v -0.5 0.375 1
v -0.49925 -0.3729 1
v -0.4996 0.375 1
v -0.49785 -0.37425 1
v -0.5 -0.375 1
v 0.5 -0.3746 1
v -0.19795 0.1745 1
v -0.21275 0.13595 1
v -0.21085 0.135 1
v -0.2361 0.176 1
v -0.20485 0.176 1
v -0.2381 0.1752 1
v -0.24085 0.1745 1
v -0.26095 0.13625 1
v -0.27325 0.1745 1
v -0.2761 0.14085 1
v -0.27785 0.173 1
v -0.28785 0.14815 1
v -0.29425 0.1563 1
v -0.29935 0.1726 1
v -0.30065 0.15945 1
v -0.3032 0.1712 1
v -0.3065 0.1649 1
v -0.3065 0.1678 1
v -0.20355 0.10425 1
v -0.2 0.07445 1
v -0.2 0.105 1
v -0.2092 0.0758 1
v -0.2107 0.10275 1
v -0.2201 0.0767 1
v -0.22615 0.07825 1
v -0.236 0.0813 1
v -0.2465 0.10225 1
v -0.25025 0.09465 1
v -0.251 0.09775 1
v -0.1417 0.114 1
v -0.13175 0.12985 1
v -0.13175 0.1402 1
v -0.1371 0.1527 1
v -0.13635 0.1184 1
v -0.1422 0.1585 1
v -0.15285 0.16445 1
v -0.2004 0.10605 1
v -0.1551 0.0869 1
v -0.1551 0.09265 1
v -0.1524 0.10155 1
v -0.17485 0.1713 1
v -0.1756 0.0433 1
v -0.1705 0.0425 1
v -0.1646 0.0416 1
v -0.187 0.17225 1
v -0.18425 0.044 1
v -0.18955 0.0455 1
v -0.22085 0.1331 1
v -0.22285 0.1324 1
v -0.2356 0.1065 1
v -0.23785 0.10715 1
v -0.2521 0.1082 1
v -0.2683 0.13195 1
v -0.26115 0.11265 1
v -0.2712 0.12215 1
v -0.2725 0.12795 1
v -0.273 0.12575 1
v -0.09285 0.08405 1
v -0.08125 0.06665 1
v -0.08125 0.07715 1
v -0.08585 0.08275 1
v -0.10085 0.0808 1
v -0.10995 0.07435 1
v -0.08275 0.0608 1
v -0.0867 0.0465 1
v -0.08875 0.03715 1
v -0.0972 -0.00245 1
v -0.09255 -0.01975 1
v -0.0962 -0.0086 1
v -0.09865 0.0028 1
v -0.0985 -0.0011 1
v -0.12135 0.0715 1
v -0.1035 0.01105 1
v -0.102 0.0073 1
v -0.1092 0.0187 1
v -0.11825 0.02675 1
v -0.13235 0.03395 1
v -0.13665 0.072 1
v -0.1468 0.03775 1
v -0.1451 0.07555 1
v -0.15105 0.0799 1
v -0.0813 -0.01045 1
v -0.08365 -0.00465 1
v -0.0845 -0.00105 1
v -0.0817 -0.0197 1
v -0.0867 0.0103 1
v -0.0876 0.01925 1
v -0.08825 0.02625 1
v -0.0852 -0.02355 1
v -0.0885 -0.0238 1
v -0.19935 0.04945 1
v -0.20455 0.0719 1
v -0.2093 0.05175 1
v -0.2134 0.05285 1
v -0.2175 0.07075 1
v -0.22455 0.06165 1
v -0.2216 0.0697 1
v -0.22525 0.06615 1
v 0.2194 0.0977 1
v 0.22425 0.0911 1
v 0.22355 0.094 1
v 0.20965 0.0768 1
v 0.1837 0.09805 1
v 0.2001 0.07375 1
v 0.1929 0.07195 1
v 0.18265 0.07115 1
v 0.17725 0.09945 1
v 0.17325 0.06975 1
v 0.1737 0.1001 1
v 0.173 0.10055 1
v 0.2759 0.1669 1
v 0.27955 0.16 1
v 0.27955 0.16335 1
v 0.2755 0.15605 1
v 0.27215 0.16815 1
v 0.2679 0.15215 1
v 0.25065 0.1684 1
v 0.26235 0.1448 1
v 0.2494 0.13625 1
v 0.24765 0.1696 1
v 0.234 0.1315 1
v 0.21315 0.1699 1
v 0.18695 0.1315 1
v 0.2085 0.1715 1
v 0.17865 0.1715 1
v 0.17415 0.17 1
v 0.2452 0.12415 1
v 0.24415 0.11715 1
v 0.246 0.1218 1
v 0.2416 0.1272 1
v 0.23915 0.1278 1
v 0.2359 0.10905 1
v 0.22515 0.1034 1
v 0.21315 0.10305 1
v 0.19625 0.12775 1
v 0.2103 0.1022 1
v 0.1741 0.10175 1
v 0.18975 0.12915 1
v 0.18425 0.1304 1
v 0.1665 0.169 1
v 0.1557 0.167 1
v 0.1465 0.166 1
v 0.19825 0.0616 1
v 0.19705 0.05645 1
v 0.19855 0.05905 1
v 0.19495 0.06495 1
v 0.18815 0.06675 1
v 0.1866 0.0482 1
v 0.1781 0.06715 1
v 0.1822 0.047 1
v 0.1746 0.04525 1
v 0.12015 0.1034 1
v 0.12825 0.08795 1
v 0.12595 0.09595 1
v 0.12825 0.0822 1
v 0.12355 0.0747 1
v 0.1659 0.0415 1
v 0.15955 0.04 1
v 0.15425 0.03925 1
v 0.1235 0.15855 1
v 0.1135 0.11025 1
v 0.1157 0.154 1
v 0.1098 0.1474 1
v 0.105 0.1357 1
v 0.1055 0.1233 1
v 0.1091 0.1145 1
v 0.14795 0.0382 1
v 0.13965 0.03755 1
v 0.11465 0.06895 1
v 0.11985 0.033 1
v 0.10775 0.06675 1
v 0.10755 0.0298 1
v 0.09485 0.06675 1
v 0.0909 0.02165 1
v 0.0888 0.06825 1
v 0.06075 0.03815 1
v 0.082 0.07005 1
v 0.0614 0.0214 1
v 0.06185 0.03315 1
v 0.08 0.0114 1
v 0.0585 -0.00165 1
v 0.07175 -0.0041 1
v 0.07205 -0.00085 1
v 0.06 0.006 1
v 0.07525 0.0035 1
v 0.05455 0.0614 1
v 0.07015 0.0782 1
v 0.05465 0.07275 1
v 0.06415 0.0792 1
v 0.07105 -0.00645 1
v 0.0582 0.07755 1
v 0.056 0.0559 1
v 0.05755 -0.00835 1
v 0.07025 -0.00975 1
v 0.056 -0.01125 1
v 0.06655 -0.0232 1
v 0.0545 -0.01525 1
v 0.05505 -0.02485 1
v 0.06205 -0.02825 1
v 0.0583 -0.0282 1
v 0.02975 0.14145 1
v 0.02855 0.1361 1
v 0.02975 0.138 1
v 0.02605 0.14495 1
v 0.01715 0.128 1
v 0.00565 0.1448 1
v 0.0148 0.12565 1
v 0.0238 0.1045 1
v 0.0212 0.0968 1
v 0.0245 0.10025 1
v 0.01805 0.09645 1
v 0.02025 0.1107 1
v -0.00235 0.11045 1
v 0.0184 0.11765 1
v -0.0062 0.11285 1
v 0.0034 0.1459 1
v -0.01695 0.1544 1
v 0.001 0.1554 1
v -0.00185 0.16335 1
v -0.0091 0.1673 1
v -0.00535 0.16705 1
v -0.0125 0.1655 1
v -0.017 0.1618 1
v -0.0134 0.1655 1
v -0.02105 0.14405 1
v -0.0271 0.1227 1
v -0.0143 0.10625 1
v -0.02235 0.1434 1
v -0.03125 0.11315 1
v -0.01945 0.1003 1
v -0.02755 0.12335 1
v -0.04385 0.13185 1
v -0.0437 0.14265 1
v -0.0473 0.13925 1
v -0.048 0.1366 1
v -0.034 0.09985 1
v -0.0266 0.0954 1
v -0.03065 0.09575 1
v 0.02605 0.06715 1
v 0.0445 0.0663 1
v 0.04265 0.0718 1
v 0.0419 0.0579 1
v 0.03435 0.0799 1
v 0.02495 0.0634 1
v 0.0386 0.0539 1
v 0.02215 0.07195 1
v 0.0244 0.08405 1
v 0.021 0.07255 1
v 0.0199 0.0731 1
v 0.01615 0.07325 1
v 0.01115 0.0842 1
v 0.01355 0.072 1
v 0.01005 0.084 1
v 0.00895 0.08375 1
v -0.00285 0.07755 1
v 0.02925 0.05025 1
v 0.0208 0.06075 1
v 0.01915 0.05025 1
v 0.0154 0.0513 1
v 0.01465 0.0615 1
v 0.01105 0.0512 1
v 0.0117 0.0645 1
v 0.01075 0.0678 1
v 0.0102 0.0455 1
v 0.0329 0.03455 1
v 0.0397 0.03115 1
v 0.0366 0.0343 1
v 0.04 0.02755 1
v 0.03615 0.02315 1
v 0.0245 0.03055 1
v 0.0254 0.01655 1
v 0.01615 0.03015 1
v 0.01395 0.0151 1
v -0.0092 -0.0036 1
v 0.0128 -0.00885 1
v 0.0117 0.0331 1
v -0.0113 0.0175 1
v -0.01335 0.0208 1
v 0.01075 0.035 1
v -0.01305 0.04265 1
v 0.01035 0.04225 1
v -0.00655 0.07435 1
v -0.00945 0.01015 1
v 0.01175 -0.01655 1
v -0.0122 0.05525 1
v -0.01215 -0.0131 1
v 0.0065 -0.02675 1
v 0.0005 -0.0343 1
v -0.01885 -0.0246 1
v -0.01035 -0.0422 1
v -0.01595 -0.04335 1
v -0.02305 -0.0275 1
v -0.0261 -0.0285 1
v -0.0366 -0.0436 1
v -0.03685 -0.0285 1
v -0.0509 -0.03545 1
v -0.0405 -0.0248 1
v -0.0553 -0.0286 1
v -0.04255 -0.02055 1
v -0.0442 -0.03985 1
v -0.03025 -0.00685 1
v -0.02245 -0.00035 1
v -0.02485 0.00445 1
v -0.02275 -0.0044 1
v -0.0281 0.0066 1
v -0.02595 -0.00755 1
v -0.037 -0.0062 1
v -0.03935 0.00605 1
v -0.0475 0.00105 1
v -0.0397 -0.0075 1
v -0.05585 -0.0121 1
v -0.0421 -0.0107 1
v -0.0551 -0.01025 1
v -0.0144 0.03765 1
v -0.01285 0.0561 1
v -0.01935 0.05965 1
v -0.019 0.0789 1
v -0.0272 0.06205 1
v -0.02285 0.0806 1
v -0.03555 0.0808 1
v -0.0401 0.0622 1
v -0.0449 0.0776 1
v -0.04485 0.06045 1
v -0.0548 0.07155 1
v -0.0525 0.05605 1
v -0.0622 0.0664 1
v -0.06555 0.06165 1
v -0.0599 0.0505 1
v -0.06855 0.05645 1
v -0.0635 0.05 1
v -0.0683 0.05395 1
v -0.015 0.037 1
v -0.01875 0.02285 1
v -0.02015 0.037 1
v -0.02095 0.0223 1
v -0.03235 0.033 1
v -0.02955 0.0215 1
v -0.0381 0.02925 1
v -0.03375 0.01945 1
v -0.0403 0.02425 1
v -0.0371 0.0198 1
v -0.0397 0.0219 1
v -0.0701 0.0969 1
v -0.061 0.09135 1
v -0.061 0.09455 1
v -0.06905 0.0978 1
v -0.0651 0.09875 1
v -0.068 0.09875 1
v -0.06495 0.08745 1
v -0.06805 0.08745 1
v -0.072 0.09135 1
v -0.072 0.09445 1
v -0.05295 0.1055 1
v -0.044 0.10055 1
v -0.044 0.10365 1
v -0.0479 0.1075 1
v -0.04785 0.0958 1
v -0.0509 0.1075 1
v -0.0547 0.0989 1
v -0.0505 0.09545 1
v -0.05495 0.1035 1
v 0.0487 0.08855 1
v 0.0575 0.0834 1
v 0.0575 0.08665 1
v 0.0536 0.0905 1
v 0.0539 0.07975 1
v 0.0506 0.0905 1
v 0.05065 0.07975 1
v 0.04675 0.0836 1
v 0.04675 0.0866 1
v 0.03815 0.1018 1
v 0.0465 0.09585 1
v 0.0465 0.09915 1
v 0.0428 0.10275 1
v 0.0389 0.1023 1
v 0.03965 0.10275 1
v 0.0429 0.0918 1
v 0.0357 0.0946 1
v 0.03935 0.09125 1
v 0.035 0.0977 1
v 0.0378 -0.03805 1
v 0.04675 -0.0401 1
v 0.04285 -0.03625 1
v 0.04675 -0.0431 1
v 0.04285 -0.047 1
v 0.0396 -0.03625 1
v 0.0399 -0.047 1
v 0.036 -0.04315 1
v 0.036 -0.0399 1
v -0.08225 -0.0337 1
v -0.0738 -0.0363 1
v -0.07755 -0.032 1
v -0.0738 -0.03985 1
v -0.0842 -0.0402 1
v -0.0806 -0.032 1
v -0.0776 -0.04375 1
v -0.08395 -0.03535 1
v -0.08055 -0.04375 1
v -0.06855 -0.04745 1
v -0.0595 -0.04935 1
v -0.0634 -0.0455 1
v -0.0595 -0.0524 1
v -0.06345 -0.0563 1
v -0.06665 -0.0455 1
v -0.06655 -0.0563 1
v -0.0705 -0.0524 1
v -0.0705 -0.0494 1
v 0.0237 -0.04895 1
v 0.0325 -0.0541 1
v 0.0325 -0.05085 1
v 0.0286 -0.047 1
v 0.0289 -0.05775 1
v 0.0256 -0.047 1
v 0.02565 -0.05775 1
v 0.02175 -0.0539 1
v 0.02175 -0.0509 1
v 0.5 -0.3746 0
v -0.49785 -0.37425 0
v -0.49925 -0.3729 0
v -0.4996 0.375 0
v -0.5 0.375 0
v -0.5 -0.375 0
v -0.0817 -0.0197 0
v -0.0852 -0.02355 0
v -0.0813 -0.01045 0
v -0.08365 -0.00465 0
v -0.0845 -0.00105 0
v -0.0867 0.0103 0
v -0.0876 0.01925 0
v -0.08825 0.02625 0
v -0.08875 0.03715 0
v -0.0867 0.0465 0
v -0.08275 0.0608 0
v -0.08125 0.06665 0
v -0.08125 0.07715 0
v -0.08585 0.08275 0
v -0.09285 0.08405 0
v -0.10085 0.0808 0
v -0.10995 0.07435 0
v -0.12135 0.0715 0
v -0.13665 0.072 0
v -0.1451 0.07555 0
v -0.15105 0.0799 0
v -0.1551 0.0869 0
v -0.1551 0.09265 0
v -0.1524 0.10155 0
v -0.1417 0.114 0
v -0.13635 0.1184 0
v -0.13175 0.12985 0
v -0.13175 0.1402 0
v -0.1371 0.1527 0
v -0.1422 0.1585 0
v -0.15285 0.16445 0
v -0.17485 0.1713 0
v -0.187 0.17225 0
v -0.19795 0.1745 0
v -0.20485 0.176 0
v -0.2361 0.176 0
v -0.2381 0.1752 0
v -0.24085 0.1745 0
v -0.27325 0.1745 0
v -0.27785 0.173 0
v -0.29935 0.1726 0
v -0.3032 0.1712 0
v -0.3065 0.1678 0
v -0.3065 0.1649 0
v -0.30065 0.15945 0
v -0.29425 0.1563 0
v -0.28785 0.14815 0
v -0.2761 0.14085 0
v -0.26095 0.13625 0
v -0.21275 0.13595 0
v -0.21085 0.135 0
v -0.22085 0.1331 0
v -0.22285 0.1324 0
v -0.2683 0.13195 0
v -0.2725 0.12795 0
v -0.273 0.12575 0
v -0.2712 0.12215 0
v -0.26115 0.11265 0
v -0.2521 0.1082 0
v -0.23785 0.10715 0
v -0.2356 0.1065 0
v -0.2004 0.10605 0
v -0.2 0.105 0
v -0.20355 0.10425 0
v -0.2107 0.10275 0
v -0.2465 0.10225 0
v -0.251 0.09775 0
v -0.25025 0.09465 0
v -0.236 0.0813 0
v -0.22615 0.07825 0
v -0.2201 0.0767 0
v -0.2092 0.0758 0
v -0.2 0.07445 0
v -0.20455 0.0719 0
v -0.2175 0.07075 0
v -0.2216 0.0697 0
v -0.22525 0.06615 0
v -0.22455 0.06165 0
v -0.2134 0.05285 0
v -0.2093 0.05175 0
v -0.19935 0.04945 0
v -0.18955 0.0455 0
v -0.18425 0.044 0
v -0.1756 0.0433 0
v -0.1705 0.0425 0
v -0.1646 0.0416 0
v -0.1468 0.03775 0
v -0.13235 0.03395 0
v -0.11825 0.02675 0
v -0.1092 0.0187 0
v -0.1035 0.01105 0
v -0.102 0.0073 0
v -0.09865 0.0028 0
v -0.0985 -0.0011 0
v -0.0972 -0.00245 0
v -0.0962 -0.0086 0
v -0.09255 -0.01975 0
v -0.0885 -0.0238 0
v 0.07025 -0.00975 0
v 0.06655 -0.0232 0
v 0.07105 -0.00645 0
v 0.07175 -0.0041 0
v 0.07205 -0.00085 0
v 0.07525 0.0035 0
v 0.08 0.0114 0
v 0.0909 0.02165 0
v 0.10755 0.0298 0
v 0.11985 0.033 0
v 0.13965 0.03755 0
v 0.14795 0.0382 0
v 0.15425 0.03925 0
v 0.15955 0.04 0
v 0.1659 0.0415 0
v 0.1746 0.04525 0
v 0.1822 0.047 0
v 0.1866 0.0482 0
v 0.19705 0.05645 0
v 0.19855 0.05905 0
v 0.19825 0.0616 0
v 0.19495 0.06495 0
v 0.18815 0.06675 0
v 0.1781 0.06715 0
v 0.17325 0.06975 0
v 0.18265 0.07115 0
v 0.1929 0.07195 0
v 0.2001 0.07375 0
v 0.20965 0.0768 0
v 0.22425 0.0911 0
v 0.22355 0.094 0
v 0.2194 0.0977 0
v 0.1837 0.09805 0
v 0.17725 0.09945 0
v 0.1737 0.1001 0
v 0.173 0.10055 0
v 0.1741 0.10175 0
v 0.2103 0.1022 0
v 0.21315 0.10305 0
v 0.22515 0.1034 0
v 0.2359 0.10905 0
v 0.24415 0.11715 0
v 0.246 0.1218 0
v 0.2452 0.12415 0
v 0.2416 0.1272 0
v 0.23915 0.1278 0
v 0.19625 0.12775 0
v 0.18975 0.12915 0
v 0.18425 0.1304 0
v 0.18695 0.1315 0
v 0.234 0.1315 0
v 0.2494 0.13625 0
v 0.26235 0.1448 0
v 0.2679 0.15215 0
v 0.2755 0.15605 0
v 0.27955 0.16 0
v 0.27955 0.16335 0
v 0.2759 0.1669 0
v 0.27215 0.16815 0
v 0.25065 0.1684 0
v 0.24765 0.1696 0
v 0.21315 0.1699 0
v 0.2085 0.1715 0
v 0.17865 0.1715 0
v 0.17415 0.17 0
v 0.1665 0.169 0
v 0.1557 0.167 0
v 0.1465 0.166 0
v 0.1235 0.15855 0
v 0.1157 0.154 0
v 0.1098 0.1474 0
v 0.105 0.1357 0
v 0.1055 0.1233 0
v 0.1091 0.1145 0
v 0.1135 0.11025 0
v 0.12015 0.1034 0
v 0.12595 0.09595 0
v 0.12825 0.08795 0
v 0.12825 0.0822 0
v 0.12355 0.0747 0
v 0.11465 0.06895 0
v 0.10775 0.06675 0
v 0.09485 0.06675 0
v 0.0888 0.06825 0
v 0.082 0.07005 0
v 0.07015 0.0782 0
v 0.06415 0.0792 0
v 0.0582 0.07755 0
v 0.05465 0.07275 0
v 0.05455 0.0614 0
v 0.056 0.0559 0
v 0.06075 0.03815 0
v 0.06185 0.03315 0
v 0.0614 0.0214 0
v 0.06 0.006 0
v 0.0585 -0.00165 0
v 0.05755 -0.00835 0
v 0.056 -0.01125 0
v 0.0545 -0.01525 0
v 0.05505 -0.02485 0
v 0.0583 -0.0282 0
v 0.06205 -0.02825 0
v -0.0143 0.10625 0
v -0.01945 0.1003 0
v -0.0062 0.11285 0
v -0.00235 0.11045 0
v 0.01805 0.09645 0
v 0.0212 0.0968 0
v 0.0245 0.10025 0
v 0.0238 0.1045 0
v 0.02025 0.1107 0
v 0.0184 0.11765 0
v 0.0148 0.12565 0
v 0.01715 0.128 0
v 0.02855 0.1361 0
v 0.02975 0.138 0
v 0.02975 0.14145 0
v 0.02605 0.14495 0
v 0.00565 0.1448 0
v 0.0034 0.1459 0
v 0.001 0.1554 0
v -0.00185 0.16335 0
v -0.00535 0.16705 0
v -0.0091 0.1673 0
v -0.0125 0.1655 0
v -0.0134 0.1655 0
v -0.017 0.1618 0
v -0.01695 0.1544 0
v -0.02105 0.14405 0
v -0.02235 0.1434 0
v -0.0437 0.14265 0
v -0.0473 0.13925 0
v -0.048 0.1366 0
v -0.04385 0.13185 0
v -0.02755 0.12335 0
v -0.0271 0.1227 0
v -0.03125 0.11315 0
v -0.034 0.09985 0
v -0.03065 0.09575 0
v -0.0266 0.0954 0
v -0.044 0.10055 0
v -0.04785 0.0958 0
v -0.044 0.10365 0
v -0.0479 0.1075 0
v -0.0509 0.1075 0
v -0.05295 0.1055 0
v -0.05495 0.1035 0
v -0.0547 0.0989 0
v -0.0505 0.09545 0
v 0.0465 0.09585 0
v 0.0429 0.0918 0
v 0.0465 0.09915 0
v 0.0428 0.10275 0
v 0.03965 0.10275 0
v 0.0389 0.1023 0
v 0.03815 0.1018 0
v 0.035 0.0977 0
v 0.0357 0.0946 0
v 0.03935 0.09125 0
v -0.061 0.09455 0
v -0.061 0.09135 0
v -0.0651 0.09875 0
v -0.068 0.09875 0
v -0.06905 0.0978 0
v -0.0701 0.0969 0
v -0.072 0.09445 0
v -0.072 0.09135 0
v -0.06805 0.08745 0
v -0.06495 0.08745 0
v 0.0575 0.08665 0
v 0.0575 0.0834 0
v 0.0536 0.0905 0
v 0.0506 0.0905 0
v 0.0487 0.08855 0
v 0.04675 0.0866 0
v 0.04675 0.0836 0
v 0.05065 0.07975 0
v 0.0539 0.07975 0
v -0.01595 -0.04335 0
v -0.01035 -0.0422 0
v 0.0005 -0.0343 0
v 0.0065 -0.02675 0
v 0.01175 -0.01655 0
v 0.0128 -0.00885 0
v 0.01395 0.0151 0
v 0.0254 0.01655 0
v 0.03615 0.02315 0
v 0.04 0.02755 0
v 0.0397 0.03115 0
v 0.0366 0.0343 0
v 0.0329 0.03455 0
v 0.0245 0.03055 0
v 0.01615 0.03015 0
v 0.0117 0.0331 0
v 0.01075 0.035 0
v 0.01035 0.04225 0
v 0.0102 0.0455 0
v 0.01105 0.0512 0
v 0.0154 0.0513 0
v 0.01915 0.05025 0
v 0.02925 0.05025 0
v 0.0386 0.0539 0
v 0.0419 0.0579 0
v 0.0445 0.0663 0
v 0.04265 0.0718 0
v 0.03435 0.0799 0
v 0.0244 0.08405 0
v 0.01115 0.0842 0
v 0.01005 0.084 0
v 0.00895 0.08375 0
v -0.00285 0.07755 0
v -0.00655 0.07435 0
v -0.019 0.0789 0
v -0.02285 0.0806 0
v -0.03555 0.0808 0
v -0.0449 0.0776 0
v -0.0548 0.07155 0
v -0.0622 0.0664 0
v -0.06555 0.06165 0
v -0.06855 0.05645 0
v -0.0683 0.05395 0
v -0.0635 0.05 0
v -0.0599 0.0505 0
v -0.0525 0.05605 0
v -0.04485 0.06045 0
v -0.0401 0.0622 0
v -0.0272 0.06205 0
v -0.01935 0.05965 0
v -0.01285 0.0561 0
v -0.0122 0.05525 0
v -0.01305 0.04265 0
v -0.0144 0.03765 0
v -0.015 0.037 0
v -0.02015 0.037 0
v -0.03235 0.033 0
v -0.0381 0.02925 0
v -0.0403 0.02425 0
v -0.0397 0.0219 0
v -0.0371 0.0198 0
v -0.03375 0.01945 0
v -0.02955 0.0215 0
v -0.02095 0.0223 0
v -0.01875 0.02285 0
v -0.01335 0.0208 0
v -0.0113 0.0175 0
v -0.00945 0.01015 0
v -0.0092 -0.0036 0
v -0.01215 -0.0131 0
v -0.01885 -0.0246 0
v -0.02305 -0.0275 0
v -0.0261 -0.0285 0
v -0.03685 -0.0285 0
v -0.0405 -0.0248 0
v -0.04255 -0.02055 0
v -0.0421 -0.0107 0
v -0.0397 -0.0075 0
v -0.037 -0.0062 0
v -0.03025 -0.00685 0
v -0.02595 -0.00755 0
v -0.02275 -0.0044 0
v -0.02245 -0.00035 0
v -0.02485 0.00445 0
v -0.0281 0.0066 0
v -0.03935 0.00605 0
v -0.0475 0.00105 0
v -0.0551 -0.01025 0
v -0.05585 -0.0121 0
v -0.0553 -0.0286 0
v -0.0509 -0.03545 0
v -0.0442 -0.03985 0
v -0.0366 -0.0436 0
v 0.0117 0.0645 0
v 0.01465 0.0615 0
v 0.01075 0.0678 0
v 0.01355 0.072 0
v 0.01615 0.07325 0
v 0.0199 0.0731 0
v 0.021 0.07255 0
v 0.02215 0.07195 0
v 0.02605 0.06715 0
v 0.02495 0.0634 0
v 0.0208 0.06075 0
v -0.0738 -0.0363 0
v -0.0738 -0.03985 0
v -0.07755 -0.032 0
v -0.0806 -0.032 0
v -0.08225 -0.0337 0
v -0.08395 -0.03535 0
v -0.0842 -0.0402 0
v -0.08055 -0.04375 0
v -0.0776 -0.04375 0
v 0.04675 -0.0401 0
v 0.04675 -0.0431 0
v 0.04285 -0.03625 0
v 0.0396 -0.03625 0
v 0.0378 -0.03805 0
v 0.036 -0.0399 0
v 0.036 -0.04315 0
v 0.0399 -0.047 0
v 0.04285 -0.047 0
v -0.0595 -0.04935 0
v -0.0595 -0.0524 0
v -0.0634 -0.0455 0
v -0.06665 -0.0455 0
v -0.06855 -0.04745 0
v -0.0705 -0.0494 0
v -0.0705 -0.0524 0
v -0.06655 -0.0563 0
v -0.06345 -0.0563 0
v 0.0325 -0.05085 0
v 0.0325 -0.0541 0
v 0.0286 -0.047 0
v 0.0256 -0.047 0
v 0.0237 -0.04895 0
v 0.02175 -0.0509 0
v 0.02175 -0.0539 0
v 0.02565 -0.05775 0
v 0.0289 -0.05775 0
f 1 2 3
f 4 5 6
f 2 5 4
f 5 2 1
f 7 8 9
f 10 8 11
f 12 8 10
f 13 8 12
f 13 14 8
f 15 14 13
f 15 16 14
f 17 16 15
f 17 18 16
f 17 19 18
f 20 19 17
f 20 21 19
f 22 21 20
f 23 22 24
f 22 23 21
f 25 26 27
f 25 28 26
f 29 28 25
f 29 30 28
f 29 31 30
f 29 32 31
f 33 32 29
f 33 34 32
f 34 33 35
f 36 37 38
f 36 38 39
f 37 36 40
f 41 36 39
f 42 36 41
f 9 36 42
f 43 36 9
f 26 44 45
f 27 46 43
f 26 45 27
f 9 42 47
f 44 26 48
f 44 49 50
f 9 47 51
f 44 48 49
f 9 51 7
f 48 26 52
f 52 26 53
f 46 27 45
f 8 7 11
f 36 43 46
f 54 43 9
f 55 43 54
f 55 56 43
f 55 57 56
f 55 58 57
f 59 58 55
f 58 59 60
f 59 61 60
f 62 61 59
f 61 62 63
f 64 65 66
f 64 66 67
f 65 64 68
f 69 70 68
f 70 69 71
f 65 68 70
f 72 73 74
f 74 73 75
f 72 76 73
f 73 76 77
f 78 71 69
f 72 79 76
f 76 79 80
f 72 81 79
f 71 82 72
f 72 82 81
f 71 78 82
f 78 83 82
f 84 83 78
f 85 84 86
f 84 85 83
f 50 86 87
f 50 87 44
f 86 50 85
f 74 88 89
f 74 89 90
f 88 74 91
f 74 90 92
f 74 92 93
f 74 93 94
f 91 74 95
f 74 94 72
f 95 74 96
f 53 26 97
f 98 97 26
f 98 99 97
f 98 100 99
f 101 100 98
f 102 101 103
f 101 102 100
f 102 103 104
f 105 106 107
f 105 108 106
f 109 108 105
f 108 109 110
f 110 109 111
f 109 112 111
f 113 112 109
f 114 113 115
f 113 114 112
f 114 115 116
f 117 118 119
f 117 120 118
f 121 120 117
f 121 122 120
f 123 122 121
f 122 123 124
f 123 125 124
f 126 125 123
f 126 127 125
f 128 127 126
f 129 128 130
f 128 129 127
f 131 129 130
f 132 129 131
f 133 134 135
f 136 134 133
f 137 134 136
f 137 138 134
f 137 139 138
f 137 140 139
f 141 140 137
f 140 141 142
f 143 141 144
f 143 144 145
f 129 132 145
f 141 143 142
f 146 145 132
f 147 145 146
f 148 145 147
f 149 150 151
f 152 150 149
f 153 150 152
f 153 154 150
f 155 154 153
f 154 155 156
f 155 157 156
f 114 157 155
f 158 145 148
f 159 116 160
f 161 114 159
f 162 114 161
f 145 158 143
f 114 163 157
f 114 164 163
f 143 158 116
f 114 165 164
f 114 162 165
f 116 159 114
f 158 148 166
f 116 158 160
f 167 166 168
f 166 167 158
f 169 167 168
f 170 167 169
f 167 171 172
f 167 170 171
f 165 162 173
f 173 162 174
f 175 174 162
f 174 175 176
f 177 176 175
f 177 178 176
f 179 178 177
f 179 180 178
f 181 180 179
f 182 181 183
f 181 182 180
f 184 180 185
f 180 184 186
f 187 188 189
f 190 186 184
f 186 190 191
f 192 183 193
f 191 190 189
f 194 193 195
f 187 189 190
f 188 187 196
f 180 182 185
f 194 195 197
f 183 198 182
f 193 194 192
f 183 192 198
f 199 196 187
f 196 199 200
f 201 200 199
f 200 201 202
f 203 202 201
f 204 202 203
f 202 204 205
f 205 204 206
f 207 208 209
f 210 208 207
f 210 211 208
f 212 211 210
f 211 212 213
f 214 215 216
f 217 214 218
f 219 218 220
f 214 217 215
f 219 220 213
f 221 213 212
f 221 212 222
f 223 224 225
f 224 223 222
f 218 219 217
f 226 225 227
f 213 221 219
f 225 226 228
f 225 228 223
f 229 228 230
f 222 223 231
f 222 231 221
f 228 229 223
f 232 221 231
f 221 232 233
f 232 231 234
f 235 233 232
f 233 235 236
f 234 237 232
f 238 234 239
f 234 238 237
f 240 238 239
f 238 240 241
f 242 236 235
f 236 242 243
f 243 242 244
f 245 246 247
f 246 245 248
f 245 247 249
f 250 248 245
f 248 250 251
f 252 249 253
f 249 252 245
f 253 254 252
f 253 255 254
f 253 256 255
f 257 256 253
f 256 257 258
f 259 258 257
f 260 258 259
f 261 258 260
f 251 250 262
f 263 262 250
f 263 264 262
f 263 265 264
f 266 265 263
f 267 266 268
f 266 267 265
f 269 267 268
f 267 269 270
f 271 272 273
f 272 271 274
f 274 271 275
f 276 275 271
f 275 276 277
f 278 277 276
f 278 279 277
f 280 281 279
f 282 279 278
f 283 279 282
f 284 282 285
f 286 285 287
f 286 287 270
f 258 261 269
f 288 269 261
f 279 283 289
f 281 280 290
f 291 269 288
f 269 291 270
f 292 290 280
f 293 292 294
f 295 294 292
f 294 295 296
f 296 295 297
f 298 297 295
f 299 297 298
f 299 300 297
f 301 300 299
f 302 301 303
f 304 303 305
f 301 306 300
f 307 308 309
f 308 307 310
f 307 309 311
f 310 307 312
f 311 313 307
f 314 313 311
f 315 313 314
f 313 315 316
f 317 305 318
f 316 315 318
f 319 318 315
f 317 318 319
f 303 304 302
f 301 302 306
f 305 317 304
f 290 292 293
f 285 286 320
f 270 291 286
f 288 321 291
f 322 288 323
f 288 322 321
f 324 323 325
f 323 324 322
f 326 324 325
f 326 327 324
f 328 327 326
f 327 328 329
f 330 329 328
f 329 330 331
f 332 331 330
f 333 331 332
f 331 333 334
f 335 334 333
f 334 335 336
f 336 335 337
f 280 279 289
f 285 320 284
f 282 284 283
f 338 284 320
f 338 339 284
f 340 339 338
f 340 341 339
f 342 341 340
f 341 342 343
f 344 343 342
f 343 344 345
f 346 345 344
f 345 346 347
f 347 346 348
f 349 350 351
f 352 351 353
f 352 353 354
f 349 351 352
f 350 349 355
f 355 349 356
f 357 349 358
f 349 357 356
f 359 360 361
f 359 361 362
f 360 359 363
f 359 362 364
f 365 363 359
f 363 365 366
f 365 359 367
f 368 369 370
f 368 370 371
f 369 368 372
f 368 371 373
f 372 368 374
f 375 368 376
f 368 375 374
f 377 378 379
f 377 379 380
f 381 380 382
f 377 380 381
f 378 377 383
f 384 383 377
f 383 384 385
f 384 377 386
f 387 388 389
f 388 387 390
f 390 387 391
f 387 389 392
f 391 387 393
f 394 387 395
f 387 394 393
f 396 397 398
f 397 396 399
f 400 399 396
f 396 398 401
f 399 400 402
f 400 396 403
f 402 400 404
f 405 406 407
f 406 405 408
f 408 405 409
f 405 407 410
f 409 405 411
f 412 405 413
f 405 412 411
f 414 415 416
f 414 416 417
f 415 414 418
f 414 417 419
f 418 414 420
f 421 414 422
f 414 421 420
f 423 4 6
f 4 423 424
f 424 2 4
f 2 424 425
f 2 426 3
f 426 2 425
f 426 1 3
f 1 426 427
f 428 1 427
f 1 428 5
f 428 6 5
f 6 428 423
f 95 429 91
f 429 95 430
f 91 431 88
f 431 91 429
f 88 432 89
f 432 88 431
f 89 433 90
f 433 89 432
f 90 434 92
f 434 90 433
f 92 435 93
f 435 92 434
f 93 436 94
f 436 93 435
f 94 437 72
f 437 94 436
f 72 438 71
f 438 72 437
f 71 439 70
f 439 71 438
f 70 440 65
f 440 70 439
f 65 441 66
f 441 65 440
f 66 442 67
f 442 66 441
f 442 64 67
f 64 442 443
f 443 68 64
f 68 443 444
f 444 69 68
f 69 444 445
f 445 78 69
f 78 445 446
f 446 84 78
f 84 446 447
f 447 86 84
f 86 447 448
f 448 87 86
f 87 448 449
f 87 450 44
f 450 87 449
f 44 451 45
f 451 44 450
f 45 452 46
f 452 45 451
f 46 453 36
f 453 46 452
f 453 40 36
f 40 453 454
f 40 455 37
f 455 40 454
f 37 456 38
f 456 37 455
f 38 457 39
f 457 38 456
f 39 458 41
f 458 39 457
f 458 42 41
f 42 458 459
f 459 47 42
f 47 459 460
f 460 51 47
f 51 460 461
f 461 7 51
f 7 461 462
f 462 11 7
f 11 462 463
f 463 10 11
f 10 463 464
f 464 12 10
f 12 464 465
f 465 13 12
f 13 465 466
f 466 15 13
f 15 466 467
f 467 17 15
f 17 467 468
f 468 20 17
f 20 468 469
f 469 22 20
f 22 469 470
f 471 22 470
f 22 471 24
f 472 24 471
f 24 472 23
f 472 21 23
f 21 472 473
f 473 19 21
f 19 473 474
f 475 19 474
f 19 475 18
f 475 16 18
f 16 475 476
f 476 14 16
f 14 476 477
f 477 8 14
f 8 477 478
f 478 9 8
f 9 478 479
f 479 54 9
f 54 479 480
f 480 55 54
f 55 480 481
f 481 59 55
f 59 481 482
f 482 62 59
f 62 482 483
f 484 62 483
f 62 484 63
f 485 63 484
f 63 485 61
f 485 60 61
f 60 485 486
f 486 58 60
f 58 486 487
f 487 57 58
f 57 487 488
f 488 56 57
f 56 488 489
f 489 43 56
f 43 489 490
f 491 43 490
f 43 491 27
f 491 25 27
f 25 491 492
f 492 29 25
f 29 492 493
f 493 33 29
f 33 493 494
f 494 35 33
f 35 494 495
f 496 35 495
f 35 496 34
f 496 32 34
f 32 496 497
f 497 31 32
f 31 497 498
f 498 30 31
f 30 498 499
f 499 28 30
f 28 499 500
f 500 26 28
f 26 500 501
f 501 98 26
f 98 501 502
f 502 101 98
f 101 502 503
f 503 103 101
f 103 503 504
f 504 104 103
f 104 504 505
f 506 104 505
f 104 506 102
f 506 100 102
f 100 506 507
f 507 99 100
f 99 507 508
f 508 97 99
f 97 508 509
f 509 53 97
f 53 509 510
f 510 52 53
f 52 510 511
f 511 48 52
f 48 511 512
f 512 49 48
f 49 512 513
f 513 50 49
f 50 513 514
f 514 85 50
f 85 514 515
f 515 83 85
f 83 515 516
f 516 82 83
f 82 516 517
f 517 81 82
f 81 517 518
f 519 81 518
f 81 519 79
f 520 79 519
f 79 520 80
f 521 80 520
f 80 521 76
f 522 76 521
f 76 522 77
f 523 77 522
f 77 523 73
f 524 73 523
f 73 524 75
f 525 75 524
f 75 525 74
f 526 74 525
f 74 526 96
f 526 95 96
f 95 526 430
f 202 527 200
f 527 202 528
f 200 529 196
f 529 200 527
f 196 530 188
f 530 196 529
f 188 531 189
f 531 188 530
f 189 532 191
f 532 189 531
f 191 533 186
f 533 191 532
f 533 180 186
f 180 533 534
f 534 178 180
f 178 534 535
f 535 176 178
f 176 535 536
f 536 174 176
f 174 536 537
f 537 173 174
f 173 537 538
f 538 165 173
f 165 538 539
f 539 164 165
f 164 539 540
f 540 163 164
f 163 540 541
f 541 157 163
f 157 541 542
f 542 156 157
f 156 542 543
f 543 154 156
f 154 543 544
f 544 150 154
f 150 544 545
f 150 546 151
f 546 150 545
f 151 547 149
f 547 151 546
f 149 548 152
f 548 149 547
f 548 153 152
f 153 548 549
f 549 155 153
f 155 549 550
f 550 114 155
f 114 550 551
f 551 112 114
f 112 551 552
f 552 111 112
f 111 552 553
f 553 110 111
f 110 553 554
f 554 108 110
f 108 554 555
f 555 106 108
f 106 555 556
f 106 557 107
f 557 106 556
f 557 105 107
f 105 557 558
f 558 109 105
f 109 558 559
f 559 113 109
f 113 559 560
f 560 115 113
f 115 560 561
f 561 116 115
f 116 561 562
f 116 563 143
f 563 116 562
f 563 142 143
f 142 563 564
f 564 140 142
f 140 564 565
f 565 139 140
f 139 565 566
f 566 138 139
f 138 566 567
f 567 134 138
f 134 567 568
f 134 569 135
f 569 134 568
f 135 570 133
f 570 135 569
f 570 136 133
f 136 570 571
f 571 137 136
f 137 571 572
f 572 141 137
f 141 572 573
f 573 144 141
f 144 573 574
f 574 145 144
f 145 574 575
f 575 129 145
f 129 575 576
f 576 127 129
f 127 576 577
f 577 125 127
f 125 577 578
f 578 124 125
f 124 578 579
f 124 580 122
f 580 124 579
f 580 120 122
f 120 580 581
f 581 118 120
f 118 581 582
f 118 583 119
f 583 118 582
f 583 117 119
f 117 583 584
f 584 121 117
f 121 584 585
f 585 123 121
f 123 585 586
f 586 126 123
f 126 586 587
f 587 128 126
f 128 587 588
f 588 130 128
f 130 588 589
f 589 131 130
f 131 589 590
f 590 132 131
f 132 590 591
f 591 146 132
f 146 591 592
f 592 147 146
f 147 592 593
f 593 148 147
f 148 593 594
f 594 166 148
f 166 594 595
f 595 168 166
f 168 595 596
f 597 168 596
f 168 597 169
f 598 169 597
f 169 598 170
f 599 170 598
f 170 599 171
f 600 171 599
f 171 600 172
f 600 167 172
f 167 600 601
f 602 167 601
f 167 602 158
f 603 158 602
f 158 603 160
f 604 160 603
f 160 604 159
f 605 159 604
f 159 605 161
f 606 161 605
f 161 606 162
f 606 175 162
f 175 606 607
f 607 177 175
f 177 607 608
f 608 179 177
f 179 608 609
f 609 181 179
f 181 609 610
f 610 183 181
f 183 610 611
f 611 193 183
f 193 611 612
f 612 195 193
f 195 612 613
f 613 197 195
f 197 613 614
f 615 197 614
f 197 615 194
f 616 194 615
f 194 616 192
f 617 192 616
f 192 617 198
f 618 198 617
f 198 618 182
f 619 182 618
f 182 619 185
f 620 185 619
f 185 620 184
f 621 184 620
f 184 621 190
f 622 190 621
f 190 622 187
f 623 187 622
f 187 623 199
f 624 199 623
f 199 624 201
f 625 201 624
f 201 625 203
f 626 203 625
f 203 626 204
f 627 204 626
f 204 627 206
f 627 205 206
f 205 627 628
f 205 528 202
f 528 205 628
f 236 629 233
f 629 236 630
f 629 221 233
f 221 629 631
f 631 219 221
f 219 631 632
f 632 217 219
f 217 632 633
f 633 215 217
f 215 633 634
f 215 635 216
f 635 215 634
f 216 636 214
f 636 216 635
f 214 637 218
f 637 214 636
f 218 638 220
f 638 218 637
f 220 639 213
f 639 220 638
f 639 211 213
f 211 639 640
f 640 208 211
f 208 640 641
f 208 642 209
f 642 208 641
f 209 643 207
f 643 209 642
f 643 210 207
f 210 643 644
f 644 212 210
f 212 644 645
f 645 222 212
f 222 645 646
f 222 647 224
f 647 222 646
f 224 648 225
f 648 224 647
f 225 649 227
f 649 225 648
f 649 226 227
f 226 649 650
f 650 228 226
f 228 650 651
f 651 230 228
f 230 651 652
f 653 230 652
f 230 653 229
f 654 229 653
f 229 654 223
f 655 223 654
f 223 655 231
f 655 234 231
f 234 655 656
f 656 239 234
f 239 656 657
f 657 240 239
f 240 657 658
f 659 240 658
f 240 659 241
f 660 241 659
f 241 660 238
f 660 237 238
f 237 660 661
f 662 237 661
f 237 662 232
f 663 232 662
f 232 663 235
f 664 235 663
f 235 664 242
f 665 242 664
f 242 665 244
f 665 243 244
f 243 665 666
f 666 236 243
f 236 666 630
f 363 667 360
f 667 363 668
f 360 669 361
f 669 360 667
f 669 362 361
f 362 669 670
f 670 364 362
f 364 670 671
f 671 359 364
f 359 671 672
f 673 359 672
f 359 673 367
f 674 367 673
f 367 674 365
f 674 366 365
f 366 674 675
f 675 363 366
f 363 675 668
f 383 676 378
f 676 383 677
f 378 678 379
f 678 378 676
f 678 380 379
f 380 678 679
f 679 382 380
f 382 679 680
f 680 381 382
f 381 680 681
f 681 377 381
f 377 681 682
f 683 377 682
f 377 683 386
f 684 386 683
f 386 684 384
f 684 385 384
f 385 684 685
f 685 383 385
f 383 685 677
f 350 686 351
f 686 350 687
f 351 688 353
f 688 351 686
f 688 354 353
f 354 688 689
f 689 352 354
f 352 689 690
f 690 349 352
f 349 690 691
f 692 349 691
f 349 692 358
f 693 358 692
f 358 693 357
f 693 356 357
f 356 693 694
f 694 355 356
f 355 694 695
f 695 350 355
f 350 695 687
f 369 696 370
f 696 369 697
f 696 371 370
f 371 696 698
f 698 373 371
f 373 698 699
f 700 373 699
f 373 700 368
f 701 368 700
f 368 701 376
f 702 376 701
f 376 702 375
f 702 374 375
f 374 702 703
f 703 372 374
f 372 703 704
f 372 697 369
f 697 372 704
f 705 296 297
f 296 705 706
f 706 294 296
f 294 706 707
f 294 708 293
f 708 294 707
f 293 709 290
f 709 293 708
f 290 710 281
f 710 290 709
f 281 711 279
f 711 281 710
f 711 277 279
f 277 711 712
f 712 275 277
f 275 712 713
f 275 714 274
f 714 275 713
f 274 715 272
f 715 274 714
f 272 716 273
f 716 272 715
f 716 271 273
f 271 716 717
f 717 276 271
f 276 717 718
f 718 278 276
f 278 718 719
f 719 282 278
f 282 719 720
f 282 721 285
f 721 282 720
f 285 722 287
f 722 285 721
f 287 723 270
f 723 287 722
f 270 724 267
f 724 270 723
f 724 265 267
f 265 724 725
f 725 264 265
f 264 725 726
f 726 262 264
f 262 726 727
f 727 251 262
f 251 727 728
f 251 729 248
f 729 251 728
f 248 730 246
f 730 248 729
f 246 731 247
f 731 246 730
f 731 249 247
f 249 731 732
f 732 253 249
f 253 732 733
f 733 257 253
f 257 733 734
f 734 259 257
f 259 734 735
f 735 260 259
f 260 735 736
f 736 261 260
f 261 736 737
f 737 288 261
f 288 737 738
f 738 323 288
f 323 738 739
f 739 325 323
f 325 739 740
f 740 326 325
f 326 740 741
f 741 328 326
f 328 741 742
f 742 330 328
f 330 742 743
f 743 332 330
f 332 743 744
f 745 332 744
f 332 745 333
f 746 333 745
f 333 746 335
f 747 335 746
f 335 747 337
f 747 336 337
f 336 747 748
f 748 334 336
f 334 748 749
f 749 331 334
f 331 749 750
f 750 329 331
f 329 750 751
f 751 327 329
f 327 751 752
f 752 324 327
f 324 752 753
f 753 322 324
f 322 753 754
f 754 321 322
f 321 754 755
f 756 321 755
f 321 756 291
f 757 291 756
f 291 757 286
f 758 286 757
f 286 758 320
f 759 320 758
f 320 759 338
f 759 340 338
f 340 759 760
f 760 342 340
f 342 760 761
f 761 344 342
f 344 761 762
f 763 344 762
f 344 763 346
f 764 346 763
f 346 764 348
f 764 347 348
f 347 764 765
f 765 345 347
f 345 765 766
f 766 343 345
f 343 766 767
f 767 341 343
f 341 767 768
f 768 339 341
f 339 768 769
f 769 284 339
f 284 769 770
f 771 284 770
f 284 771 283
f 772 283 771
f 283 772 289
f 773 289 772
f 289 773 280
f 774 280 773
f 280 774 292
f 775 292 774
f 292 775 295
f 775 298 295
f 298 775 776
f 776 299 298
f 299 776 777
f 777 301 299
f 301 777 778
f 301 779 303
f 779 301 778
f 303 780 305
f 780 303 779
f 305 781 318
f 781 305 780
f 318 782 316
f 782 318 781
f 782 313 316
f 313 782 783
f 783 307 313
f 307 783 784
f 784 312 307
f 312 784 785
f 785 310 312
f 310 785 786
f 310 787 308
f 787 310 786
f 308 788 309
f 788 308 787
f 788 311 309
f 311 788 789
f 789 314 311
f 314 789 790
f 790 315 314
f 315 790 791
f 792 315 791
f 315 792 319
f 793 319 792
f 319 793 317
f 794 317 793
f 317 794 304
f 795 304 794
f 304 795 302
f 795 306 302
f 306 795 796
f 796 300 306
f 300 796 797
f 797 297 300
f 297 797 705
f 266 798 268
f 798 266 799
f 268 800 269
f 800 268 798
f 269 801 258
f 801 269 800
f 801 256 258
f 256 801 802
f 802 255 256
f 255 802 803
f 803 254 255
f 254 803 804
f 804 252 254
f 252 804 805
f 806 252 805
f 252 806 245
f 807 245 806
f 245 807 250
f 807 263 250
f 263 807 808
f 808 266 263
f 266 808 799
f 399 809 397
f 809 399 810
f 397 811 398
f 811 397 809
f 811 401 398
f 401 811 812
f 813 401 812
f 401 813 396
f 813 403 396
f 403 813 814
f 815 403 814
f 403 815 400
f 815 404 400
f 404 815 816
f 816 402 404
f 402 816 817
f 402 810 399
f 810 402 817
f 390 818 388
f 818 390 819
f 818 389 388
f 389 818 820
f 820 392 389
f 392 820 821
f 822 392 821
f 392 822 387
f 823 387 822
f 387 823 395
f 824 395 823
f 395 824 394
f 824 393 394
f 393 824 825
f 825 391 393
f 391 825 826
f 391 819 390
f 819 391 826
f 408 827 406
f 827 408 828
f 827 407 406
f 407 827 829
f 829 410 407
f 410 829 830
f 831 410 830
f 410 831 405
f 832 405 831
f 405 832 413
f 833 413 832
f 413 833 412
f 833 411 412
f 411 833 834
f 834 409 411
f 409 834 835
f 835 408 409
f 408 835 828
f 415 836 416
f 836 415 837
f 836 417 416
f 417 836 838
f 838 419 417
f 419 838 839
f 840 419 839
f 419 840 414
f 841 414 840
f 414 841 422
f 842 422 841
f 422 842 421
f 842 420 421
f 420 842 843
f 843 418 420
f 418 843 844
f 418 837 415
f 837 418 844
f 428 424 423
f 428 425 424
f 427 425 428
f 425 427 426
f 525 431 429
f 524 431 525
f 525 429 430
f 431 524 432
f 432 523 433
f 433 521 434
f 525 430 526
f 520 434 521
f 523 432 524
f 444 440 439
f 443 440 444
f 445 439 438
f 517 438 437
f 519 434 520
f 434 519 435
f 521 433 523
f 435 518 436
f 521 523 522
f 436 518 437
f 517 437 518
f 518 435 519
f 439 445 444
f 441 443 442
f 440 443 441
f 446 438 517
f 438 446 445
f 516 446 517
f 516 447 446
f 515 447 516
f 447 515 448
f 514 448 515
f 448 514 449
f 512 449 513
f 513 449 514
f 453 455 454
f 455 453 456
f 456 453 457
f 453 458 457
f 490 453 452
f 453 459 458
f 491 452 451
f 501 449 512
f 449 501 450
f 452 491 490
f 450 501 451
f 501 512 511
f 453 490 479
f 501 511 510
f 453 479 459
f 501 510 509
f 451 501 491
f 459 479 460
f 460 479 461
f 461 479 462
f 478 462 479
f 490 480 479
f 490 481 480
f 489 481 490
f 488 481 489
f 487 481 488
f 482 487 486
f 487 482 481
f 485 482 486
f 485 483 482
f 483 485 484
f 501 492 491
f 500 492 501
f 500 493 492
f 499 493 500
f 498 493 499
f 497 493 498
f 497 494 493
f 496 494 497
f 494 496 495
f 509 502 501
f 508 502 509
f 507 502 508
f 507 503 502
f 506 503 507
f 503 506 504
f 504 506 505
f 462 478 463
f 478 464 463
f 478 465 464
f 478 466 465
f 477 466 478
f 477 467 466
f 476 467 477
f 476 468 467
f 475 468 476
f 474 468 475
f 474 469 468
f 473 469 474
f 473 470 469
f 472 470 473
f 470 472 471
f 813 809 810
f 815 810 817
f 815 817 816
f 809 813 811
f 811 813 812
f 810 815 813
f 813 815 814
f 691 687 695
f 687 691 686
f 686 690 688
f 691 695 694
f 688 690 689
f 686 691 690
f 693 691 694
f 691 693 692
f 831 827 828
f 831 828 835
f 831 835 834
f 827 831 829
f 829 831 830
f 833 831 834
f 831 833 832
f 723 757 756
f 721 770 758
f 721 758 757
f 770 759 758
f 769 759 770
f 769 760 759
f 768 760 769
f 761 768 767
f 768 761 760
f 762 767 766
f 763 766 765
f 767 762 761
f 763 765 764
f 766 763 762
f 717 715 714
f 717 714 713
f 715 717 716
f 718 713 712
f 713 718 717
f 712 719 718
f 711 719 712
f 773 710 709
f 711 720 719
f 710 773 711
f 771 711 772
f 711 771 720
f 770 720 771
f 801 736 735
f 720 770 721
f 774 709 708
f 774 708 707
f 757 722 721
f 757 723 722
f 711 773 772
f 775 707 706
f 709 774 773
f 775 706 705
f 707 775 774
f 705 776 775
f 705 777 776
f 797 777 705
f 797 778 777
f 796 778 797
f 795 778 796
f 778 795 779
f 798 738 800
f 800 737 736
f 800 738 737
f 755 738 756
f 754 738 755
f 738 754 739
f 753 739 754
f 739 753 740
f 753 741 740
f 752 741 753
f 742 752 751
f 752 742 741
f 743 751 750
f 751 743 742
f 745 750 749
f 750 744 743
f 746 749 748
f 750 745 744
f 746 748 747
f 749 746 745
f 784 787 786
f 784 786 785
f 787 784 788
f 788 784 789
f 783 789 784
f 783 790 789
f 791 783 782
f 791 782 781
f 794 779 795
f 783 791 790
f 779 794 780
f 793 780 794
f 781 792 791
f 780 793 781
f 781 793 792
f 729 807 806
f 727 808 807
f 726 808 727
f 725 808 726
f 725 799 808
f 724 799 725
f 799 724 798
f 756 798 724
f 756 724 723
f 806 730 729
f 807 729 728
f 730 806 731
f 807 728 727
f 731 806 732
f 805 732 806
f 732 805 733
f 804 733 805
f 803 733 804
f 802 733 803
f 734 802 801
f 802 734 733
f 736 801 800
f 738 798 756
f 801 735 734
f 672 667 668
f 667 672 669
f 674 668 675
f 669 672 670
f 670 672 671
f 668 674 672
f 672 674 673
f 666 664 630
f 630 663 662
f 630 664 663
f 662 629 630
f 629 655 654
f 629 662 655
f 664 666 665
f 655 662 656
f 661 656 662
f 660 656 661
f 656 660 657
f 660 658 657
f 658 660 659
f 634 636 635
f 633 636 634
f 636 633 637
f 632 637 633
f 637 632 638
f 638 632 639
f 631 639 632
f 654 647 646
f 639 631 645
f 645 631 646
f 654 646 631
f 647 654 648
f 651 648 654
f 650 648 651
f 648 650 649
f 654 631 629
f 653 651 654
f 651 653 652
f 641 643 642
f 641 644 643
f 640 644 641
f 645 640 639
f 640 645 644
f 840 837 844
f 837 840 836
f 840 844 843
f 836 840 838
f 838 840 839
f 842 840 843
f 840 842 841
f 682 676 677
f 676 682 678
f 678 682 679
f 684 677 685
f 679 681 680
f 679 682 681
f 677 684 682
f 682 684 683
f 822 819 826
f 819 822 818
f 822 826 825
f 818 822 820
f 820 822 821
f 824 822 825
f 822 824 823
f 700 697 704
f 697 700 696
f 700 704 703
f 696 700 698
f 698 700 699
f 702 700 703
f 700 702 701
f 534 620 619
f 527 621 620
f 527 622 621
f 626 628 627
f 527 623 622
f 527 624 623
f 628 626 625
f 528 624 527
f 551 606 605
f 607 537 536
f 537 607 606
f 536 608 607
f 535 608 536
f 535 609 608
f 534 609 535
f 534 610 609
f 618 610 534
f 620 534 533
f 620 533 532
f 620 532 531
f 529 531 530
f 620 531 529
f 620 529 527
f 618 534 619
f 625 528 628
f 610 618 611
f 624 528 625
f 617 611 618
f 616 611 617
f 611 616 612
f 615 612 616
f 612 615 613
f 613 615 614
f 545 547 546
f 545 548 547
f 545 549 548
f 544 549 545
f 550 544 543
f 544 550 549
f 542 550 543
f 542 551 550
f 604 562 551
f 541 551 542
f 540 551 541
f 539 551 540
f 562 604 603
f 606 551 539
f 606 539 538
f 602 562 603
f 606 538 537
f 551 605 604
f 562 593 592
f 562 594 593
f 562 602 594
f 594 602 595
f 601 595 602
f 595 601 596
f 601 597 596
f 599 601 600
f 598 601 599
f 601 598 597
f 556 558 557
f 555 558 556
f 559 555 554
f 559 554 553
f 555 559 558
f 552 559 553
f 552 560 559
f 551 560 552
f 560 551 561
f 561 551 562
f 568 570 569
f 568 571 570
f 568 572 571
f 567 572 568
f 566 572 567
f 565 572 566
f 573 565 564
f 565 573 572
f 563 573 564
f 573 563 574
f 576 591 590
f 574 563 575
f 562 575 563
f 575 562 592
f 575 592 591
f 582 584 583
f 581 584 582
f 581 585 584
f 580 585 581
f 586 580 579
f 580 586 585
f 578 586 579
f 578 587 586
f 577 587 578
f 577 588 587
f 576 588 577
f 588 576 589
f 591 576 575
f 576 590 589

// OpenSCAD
module FlyingF_1()
{
 /* Generated by trace2scad version 20150415
    http://aggregate.org/MAKE/TRACE2SCAD/
    Optimized model has 427/1534 original points
 */
 color([0.5, 0.5, 0.5])
 assign(minx=0) /* polygon minx=0 */
 assign(miny=0) /* polygon miny=0 */
 assign(maxx=20000) /* polygon maxx=20000 */
 assign(maxy=15000) /* polygon maxy=15000 */
 assign(dx=maxx-minx)
 assign(dy=maxy-miny)
 assign(maxd=((dx>dy)?dx:dy))
 scale([1/maxd, 1/maxd, 1])
 translate([-minx-dx/2, -miny-dy/2, 0])
 linear_extrude(height=1, convexity=427)
 union() {
  union() {
   polygon([[0,7500],[0,0],[20000,8],[43,15],[15,42],[8,15000],[0,15000]], convexity=5);
   polygon([[5258,11012],[5238,11004],[5183,10990],[4535,10990],[4443,10960],[4013,10952],[3936,10924],[3870,10856],[3870,10798],[3987,10689],[4115,10626],[4243,10463],[4478,10317],[4781,10225],[5745,10219],[5783,10200],[5583,10162],[5543,10148],[4634,10139],[4550,10059],[4540,10015],[4576,9943],[4777,9753],[4958,9664],[5243,9643],[5288,9630],[5992,9621],[6000,9600],[5929,9585],[5786,9555],[5070,9545],[4980,9455],[4995,9393],[5280,9126],[5477,9065],[5598,9034],[5816,9016],[6000,8989],[5909,8938],[5650,8915],[5568,8894],[5495,8823],[5509,8733],[5732,8557],[5814,8535],[6013,8489],[6209,8410],[6315,8380],[6488,8366],[6590,8350],[6708,8332],[7064,8255],[7353,8179],[7635,8035],[7816,7874],[7930,7721],[7960,7646],[8027,7556],[8030,7478],[8056,7451],[8076,7328],[8149,7105],[8230,7024],[8296,7029],[8366,7106],[8374,7291],[8327,7407],[8310,7479],[8266,7706],[8248,7885],[8235,8025],[8225,8243],[8266,8430],[8345,8716],[8375,8833],[8375,9043],[8283,9155],[8143,9181],[7983,9116],[7801,8987],[7693,8960],[7573,8930],[7267,8940],[7098,9011],[6979,9098],[6898,9238],[6898,9353],[6952,9531],[7166,9780],[7273,9868],[7365,10097],[7365,10304],[7258,10554],[7156,10670],[6943,10789],[6503,10926],[6260,10945],[6041,10990],[5903,11020],[5278,11020]], convexity=20);
   polygon([[13528,10915],[13483,10900],[13330,10880],[13114,10840],[12930,10820],[12470,10671],[12314,10580],[12196,10448],[12100,10214],[12110,9966],[12182,9790],[12270,9705],[12403,9568],[12519,9419],[12565,9259],[12565,9144],[12471,8994],[12293,8879],[12155,8835],[11897,8835],[11776,8865],[11640,8901],[11403,9064],[11283,9084],[11164,9051],[11093,8955],[11091,8728],[11120,8618],[11215,8263],[11237,8163],[11228,7928],[11200,7620],[11170,7467],[11151,7333],[11120,7275],[11090,7195],[11101,7003],[11166,6936],[11241,6935],[11331,7036],[11405,7305],[11421,7371],[11435,7418],[11441,7483],[11505,7570],[11600,7728],[11818,7933],[12151,8096],[12397,8160],[12793,8251],[12959,8264],[13085,8285],[13191,8300],[13318,8330],[13492,8405],[13644,8440],[13732,8464],[13941,8629],[13971,8681],[13965,8732],[13899,8799],[13763,8835],[13562,8843],[13465,8895],[13653,8923],[13858,8939],[14002,8975],[14193,9036],[14485,9322],[14471,9380],[14388,9454],[13674,9461],[13545,9489],[13474,9502],[13460,9511],[13482,9535],[14206,9544],[14263,9561],[14503,9568],[14718,9681],[14883,9843],[14920,9936],[14904,9983],[14832,10044],[14783,10056],[13925,10055],[13795,10083],[13685,10108],[13739,10130],[14680,10130],[14988,10225],[15247,10396],[15358,10543],[15510,10621],[15591,10700],[15591,10767],[15518,10838],[15443,10863],[15013,10868],[14953,10892],[14263,10898],[14170,10930],[13573,10930]], convexity=20);
   polygon([[9784,10828],[9750,10810],[9732,10810],[9660,10736],[9661,10588],[9579,10381],[9553,10368],[9126,10353],[9054,10285],[9040,10232],[9123,10137],[9449,9967],[9458,9954],[9375,9763],[9320,9497],[9387,9415],[9468,9408],[9611,9506],[9714,9625],[9876,9757],[9953,9709],[10361,9429],[10424,9436],[10490,9505],[10476,9590],[10405,9714],[10368,9853],[10296,10013],[10343,10060],[10571,10222],[10595,10260],[10595,10329],[10521,10399],[10113,10396],[10068,10418],[10020,10608],[9963,10767],[9893,10841],[9818,10846]], convexity=18);
   polygon([[8941,9610],[8901,9570],[8906,9478],[8990,9409],[9043,9416],[9120,9511],[9120,9573],[9042,9650],[8982,9650]], convexity=6);
   polygon([[10778,9546],[10763,9536],[10700,9454],[10714,9392],[10787,9325],[10858,9336],[10930,9417],[10930,9483],[10856,9555],[10793,9555]], convexity=6);
   polygon([[8619,9456],[8598,9438],[8560,9389],[8560,9327],[8639,9249],[8701,9249],[8780,9327],[8780,9391],[8698,9475],[8640,9475]], convexity=6);
   polygon([[10974,9271],[10935,9232],[10935,9172],[11013,9095],[11078,9095],[11150,9168],[11150,9233],[11072,9310],[11012,9310]], convexity=6);
   union() {
    difference() {
     polygon([[10201,9180],[10179,9175],[9943,9051],[9869,8987],[9620,9078],[9543,9112],[9289,9116],[9102,9052],[8904,8931],[8756,8828],[8689,8733],[8629,8629],[8634,8579],[8730,8500],[8802,8510],[8950,8621],[9103,8709],[9198,8744],[9456,8741],[9613,8693],[9743,8622],[9756,8605],[9739,8353],[9712,8253],[9700,8240],[9597,8240],[9353,8160],[9238,8085],[9194,7985],[9206,7938],[9258,7896],[9325,7889],[9409,7930],[9581,7946],[9625,7957],[9733,7916],[9774,7850],[9811,7703],[9816,7428],[9757,7238],[9623,7008],[9539,6950],[9478,6930],[9263,6930],[9190,7004],[9149,7089],[9158,7286],[9206,7350],[9260,7376],[9395,7363],[9481,7349],[9545,7412],[9551,7493],[9503,7589],[9438,7632],[9213,7621],[9050,7521],[8898,7295],[8883,7258],[8894,6928],[8982,6791],[9116,6703],[9268,6628],[9681,6633],[9793,6656],[10010,6814],[10130,6965],[10235,7169],[10256,7323],[10279,7802],[10508,7831],[10723,7963],[10800,8051],[10794,8123],[10732,8186],[10658,8191],[10490,8111],[10323,8103],[10234,8162],[10215,8200],[10207,8345],[10204,8410],[10221,8524],[10308,8526],[10383,8505],[10585,8505],[10772,8578],[10838,8658],[10890,8826],[10853,8936],[10687,9098],[10488,9181],[10223,9184]], convexity=30);
     polygon([[10420,8951],[10443,8939],[10521,8843],[10499,8768],[10416,8715],[10293,8730],[10234,8790],[10215,8856],[10271,8940],[10323,8965],[10398,8962]], convexity=7);
    }
   }
   polygon([[8355,6826],[8321,6793],[8316,6696],[8389,6625],[8448,6625],[8524,6703],[8524,6774],[8449,6860],[8388,6860]], convexity=6);
   polygon([[10756,6739],[10720,6702],[10720,6637],[10798,6560],[10857,6560],[10935,6638],[10935,6698],[10857,6775],[10792,6775]], convexity=6);
   polygon([[8629,6551],[8590,6512],[8590,6452],[8669,6374],[8731,6374],[8810,6452],[8810,6513],[8732,6590],[8667,6590]], convexity=6);
   polygon([[10474,6521],[10435,6482],[10435,6422],[10513,6345],[10578,6345],[10650,6418],[10650,6483],[10572,6560],[10512,6560]], convexity=6);
  }
 }
}

module FlyingF()
{
 /* all layers combined, scaled to within a 1mm cube */
 scale([1, 1, 1/1])
 difference() {
  union() {
   scale([1,1,2]) translate([0,0,-0.5]) FlyingF_1();
  }
  translate([0,0,-2]) cube([2,2,4],center=true);
 }
}
FlyingF();
